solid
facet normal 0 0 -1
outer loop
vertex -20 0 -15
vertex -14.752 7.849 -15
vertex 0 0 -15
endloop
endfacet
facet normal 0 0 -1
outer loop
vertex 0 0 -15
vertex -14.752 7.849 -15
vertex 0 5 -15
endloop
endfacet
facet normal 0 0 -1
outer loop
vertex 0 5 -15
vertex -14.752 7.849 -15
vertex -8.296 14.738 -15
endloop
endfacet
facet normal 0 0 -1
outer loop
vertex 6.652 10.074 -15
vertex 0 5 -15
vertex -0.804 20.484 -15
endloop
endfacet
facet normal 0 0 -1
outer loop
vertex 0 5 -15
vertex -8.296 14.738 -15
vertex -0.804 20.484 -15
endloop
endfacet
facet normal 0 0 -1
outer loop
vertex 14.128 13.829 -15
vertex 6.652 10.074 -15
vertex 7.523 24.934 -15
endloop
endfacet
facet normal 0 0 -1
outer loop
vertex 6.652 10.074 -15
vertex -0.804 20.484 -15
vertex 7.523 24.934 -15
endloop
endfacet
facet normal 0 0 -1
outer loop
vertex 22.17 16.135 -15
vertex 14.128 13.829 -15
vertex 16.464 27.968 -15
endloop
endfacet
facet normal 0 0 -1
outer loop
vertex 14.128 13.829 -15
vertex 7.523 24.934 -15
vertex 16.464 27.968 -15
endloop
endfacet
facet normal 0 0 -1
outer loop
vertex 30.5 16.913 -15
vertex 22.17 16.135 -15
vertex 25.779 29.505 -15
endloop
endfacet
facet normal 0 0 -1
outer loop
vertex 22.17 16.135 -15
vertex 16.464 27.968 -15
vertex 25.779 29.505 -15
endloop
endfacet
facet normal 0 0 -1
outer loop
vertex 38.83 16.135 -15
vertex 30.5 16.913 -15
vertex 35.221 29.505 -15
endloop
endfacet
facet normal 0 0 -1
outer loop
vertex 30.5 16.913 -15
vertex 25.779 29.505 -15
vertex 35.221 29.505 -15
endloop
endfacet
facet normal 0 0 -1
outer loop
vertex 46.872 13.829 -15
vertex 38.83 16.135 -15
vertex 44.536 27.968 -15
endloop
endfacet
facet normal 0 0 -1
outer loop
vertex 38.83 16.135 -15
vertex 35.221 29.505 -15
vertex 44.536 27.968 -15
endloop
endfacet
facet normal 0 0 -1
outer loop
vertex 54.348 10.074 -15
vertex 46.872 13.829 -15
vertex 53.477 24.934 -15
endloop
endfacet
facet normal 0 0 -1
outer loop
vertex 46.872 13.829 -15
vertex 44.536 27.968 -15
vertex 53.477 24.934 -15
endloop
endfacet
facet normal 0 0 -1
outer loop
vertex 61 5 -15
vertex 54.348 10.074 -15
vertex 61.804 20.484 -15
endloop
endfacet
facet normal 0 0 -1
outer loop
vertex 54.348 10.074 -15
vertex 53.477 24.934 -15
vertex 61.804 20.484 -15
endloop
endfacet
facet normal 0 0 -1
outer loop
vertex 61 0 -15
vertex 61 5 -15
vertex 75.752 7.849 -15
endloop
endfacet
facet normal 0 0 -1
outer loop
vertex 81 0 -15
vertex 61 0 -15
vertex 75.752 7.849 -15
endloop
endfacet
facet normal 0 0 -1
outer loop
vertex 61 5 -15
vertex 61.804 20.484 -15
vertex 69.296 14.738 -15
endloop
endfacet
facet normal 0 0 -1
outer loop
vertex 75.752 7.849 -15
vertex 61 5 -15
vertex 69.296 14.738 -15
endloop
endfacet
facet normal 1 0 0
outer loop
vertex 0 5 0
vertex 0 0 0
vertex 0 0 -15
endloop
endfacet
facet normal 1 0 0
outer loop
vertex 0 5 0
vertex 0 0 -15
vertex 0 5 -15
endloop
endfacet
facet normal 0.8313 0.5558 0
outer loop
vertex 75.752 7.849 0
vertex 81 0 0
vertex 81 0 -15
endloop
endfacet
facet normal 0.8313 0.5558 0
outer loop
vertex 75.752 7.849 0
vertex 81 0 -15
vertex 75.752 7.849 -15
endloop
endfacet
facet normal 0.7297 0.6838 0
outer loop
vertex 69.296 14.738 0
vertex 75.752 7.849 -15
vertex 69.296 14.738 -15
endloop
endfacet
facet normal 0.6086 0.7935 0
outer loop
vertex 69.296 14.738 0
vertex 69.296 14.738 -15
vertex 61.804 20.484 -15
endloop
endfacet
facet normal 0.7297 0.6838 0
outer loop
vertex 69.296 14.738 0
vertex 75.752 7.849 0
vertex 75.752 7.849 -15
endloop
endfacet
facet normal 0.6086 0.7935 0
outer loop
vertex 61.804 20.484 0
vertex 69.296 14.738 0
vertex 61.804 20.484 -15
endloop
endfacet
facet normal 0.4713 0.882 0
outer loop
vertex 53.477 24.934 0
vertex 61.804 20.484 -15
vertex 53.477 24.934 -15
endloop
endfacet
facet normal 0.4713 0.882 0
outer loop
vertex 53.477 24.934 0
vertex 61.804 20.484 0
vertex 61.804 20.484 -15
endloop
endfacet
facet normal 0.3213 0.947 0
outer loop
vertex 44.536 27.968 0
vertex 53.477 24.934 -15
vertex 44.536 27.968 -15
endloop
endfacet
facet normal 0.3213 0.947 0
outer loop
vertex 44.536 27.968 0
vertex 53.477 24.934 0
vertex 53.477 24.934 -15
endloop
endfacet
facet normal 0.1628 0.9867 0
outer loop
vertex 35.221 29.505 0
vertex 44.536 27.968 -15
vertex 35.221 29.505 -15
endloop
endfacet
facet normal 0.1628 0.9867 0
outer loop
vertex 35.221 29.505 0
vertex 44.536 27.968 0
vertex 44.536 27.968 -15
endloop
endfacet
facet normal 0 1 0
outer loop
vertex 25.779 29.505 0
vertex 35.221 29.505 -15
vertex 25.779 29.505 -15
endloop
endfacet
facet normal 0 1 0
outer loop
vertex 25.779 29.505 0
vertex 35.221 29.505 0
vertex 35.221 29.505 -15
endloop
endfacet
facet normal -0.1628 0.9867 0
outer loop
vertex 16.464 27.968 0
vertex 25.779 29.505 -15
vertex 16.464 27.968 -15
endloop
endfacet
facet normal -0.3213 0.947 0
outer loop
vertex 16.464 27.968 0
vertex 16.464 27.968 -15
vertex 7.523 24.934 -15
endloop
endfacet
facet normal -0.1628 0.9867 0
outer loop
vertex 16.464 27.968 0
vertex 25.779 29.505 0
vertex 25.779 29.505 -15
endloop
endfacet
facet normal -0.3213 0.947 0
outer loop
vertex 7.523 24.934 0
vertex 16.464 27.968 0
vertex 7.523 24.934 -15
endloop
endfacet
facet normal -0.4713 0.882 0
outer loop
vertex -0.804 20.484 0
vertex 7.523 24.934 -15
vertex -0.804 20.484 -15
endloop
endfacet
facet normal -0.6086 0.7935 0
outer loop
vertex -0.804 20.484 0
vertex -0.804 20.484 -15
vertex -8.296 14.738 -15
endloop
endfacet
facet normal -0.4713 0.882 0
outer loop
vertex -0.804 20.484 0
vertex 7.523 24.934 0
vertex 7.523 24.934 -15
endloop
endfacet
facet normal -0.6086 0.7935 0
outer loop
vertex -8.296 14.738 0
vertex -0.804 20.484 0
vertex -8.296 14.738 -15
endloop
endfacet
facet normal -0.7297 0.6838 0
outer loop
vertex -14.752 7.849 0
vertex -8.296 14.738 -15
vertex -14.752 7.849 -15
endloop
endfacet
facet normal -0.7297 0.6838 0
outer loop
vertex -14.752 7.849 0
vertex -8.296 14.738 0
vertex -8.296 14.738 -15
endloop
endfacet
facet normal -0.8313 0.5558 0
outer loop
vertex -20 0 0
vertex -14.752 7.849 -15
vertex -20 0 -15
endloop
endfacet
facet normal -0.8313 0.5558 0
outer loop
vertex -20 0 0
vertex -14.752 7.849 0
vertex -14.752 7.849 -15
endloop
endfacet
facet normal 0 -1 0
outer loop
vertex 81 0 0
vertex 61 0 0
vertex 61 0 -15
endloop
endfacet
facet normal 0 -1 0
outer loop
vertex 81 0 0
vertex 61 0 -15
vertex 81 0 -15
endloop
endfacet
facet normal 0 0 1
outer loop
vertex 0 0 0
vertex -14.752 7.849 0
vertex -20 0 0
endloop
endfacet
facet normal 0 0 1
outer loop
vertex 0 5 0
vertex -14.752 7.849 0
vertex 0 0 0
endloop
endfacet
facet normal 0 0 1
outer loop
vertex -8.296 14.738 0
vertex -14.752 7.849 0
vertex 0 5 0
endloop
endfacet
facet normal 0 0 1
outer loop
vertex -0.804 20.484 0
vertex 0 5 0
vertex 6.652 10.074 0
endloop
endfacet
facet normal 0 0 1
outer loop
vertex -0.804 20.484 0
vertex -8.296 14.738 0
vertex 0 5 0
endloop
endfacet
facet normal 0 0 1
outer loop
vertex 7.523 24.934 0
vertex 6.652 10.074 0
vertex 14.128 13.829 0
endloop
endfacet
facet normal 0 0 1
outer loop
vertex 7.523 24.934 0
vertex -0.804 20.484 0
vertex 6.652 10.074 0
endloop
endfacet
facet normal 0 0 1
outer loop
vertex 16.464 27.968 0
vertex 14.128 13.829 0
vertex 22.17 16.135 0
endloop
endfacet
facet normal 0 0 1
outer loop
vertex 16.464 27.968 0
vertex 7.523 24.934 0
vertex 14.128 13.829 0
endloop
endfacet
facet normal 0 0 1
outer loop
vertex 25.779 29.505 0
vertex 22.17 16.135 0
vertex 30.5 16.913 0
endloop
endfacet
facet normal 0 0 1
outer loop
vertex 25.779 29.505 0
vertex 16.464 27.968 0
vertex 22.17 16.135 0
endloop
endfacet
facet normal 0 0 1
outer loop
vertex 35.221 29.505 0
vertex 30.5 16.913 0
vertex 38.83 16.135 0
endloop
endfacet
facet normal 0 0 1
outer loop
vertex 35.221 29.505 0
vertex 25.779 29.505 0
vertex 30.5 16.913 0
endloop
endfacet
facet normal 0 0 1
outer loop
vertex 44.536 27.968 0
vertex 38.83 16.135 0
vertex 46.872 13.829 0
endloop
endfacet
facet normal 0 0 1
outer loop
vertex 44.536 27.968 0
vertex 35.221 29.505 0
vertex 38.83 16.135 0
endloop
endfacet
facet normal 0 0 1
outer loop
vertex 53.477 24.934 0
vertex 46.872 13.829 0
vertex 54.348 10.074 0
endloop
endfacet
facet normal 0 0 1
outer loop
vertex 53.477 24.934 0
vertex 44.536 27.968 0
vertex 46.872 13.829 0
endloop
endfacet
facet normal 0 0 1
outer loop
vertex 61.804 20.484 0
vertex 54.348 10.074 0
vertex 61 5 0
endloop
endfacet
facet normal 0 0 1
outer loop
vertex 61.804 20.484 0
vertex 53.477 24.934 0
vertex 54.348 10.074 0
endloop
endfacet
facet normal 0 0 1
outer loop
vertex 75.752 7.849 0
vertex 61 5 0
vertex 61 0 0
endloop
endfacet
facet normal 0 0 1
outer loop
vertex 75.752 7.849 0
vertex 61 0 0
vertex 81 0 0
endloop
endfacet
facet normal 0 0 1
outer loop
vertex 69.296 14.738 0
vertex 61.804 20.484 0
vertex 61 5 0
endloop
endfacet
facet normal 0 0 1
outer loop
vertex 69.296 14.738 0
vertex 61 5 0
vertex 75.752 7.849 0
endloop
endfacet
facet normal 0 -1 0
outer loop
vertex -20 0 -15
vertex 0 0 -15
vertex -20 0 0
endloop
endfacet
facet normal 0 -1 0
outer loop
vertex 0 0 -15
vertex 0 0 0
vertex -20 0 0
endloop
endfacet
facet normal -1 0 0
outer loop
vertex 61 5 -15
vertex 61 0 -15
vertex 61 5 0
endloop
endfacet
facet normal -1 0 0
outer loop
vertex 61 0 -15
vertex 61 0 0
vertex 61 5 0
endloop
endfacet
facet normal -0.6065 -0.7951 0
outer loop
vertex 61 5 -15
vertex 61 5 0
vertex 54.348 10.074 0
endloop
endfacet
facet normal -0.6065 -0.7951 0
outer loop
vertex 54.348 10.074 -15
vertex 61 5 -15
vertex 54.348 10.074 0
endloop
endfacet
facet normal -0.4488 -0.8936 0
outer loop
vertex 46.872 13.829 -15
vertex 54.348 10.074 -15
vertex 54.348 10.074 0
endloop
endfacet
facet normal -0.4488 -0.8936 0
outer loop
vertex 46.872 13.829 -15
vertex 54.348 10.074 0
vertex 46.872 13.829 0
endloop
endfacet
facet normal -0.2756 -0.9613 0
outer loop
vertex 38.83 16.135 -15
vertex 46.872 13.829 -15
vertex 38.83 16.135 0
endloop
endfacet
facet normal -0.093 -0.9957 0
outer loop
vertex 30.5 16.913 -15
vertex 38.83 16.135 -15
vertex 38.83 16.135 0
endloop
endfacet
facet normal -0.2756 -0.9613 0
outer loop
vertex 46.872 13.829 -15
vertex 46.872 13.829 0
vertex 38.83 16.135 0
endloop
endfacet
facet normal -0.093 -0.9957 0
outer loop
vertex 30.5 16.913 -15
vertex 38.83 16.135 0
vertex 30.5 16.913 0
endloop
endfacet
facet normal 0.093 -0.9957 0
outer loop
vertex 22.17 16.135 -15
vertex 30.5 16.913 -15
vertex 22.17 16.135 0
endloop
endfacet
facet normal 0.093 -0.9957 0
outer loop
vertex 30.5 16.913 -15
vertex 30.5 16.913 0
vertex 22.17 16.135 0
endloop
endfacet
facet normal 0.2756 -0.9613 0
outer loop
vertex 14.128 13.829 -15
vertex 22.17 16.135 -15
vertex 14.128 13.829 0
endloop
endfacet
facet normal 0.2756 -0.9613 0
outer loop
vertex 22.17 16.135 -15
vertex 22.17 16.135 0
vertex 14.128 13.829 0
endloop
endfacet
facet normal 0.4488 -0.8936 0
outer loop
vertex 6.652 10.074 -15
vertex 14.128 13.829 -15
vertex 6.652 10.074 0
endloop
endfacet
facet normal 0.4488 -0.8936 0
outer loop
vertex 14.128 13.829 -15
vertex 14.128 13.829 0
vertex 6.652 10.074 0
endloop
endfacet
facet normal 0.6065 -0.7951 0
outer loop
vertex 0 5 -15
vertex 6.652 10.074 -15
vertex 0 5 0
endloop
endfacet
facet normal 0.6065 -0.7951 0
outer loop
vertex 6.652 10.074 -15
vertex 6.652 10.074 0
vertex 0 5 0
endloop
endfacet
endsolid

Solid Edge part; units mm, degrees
sketch "Sketch1" plane through (0, 0, 0) normal (0, 0, 1) x (1, 0, 0)
  line L0 (0, 0) -> (0, 5)
  arc A0 (61, 5) -> (0, 5) centre (30.5, -28.087) ccw
  line L1 (61, 0) -> (61, 5)
  line L2 (61, 0) -> (81, 0)
  arc A1 (81, 0) -> (-20, 0) centre (30.5, -28.087) ccw
  line L3 (0, 0) -> (-20, 0)
  dimension "D1" = 5
  dimension "D2" = 5
  dimension "D3" = 61
  dimension "D4" = 20
  dimension "D5" = 20
  dimension "D6" = 45
  dimension "D7" = 57.7852
extrude "Protrusion1" add sketch "Sketch1" against normal blind 15
properties material "Aluminum, 6061-T6"
